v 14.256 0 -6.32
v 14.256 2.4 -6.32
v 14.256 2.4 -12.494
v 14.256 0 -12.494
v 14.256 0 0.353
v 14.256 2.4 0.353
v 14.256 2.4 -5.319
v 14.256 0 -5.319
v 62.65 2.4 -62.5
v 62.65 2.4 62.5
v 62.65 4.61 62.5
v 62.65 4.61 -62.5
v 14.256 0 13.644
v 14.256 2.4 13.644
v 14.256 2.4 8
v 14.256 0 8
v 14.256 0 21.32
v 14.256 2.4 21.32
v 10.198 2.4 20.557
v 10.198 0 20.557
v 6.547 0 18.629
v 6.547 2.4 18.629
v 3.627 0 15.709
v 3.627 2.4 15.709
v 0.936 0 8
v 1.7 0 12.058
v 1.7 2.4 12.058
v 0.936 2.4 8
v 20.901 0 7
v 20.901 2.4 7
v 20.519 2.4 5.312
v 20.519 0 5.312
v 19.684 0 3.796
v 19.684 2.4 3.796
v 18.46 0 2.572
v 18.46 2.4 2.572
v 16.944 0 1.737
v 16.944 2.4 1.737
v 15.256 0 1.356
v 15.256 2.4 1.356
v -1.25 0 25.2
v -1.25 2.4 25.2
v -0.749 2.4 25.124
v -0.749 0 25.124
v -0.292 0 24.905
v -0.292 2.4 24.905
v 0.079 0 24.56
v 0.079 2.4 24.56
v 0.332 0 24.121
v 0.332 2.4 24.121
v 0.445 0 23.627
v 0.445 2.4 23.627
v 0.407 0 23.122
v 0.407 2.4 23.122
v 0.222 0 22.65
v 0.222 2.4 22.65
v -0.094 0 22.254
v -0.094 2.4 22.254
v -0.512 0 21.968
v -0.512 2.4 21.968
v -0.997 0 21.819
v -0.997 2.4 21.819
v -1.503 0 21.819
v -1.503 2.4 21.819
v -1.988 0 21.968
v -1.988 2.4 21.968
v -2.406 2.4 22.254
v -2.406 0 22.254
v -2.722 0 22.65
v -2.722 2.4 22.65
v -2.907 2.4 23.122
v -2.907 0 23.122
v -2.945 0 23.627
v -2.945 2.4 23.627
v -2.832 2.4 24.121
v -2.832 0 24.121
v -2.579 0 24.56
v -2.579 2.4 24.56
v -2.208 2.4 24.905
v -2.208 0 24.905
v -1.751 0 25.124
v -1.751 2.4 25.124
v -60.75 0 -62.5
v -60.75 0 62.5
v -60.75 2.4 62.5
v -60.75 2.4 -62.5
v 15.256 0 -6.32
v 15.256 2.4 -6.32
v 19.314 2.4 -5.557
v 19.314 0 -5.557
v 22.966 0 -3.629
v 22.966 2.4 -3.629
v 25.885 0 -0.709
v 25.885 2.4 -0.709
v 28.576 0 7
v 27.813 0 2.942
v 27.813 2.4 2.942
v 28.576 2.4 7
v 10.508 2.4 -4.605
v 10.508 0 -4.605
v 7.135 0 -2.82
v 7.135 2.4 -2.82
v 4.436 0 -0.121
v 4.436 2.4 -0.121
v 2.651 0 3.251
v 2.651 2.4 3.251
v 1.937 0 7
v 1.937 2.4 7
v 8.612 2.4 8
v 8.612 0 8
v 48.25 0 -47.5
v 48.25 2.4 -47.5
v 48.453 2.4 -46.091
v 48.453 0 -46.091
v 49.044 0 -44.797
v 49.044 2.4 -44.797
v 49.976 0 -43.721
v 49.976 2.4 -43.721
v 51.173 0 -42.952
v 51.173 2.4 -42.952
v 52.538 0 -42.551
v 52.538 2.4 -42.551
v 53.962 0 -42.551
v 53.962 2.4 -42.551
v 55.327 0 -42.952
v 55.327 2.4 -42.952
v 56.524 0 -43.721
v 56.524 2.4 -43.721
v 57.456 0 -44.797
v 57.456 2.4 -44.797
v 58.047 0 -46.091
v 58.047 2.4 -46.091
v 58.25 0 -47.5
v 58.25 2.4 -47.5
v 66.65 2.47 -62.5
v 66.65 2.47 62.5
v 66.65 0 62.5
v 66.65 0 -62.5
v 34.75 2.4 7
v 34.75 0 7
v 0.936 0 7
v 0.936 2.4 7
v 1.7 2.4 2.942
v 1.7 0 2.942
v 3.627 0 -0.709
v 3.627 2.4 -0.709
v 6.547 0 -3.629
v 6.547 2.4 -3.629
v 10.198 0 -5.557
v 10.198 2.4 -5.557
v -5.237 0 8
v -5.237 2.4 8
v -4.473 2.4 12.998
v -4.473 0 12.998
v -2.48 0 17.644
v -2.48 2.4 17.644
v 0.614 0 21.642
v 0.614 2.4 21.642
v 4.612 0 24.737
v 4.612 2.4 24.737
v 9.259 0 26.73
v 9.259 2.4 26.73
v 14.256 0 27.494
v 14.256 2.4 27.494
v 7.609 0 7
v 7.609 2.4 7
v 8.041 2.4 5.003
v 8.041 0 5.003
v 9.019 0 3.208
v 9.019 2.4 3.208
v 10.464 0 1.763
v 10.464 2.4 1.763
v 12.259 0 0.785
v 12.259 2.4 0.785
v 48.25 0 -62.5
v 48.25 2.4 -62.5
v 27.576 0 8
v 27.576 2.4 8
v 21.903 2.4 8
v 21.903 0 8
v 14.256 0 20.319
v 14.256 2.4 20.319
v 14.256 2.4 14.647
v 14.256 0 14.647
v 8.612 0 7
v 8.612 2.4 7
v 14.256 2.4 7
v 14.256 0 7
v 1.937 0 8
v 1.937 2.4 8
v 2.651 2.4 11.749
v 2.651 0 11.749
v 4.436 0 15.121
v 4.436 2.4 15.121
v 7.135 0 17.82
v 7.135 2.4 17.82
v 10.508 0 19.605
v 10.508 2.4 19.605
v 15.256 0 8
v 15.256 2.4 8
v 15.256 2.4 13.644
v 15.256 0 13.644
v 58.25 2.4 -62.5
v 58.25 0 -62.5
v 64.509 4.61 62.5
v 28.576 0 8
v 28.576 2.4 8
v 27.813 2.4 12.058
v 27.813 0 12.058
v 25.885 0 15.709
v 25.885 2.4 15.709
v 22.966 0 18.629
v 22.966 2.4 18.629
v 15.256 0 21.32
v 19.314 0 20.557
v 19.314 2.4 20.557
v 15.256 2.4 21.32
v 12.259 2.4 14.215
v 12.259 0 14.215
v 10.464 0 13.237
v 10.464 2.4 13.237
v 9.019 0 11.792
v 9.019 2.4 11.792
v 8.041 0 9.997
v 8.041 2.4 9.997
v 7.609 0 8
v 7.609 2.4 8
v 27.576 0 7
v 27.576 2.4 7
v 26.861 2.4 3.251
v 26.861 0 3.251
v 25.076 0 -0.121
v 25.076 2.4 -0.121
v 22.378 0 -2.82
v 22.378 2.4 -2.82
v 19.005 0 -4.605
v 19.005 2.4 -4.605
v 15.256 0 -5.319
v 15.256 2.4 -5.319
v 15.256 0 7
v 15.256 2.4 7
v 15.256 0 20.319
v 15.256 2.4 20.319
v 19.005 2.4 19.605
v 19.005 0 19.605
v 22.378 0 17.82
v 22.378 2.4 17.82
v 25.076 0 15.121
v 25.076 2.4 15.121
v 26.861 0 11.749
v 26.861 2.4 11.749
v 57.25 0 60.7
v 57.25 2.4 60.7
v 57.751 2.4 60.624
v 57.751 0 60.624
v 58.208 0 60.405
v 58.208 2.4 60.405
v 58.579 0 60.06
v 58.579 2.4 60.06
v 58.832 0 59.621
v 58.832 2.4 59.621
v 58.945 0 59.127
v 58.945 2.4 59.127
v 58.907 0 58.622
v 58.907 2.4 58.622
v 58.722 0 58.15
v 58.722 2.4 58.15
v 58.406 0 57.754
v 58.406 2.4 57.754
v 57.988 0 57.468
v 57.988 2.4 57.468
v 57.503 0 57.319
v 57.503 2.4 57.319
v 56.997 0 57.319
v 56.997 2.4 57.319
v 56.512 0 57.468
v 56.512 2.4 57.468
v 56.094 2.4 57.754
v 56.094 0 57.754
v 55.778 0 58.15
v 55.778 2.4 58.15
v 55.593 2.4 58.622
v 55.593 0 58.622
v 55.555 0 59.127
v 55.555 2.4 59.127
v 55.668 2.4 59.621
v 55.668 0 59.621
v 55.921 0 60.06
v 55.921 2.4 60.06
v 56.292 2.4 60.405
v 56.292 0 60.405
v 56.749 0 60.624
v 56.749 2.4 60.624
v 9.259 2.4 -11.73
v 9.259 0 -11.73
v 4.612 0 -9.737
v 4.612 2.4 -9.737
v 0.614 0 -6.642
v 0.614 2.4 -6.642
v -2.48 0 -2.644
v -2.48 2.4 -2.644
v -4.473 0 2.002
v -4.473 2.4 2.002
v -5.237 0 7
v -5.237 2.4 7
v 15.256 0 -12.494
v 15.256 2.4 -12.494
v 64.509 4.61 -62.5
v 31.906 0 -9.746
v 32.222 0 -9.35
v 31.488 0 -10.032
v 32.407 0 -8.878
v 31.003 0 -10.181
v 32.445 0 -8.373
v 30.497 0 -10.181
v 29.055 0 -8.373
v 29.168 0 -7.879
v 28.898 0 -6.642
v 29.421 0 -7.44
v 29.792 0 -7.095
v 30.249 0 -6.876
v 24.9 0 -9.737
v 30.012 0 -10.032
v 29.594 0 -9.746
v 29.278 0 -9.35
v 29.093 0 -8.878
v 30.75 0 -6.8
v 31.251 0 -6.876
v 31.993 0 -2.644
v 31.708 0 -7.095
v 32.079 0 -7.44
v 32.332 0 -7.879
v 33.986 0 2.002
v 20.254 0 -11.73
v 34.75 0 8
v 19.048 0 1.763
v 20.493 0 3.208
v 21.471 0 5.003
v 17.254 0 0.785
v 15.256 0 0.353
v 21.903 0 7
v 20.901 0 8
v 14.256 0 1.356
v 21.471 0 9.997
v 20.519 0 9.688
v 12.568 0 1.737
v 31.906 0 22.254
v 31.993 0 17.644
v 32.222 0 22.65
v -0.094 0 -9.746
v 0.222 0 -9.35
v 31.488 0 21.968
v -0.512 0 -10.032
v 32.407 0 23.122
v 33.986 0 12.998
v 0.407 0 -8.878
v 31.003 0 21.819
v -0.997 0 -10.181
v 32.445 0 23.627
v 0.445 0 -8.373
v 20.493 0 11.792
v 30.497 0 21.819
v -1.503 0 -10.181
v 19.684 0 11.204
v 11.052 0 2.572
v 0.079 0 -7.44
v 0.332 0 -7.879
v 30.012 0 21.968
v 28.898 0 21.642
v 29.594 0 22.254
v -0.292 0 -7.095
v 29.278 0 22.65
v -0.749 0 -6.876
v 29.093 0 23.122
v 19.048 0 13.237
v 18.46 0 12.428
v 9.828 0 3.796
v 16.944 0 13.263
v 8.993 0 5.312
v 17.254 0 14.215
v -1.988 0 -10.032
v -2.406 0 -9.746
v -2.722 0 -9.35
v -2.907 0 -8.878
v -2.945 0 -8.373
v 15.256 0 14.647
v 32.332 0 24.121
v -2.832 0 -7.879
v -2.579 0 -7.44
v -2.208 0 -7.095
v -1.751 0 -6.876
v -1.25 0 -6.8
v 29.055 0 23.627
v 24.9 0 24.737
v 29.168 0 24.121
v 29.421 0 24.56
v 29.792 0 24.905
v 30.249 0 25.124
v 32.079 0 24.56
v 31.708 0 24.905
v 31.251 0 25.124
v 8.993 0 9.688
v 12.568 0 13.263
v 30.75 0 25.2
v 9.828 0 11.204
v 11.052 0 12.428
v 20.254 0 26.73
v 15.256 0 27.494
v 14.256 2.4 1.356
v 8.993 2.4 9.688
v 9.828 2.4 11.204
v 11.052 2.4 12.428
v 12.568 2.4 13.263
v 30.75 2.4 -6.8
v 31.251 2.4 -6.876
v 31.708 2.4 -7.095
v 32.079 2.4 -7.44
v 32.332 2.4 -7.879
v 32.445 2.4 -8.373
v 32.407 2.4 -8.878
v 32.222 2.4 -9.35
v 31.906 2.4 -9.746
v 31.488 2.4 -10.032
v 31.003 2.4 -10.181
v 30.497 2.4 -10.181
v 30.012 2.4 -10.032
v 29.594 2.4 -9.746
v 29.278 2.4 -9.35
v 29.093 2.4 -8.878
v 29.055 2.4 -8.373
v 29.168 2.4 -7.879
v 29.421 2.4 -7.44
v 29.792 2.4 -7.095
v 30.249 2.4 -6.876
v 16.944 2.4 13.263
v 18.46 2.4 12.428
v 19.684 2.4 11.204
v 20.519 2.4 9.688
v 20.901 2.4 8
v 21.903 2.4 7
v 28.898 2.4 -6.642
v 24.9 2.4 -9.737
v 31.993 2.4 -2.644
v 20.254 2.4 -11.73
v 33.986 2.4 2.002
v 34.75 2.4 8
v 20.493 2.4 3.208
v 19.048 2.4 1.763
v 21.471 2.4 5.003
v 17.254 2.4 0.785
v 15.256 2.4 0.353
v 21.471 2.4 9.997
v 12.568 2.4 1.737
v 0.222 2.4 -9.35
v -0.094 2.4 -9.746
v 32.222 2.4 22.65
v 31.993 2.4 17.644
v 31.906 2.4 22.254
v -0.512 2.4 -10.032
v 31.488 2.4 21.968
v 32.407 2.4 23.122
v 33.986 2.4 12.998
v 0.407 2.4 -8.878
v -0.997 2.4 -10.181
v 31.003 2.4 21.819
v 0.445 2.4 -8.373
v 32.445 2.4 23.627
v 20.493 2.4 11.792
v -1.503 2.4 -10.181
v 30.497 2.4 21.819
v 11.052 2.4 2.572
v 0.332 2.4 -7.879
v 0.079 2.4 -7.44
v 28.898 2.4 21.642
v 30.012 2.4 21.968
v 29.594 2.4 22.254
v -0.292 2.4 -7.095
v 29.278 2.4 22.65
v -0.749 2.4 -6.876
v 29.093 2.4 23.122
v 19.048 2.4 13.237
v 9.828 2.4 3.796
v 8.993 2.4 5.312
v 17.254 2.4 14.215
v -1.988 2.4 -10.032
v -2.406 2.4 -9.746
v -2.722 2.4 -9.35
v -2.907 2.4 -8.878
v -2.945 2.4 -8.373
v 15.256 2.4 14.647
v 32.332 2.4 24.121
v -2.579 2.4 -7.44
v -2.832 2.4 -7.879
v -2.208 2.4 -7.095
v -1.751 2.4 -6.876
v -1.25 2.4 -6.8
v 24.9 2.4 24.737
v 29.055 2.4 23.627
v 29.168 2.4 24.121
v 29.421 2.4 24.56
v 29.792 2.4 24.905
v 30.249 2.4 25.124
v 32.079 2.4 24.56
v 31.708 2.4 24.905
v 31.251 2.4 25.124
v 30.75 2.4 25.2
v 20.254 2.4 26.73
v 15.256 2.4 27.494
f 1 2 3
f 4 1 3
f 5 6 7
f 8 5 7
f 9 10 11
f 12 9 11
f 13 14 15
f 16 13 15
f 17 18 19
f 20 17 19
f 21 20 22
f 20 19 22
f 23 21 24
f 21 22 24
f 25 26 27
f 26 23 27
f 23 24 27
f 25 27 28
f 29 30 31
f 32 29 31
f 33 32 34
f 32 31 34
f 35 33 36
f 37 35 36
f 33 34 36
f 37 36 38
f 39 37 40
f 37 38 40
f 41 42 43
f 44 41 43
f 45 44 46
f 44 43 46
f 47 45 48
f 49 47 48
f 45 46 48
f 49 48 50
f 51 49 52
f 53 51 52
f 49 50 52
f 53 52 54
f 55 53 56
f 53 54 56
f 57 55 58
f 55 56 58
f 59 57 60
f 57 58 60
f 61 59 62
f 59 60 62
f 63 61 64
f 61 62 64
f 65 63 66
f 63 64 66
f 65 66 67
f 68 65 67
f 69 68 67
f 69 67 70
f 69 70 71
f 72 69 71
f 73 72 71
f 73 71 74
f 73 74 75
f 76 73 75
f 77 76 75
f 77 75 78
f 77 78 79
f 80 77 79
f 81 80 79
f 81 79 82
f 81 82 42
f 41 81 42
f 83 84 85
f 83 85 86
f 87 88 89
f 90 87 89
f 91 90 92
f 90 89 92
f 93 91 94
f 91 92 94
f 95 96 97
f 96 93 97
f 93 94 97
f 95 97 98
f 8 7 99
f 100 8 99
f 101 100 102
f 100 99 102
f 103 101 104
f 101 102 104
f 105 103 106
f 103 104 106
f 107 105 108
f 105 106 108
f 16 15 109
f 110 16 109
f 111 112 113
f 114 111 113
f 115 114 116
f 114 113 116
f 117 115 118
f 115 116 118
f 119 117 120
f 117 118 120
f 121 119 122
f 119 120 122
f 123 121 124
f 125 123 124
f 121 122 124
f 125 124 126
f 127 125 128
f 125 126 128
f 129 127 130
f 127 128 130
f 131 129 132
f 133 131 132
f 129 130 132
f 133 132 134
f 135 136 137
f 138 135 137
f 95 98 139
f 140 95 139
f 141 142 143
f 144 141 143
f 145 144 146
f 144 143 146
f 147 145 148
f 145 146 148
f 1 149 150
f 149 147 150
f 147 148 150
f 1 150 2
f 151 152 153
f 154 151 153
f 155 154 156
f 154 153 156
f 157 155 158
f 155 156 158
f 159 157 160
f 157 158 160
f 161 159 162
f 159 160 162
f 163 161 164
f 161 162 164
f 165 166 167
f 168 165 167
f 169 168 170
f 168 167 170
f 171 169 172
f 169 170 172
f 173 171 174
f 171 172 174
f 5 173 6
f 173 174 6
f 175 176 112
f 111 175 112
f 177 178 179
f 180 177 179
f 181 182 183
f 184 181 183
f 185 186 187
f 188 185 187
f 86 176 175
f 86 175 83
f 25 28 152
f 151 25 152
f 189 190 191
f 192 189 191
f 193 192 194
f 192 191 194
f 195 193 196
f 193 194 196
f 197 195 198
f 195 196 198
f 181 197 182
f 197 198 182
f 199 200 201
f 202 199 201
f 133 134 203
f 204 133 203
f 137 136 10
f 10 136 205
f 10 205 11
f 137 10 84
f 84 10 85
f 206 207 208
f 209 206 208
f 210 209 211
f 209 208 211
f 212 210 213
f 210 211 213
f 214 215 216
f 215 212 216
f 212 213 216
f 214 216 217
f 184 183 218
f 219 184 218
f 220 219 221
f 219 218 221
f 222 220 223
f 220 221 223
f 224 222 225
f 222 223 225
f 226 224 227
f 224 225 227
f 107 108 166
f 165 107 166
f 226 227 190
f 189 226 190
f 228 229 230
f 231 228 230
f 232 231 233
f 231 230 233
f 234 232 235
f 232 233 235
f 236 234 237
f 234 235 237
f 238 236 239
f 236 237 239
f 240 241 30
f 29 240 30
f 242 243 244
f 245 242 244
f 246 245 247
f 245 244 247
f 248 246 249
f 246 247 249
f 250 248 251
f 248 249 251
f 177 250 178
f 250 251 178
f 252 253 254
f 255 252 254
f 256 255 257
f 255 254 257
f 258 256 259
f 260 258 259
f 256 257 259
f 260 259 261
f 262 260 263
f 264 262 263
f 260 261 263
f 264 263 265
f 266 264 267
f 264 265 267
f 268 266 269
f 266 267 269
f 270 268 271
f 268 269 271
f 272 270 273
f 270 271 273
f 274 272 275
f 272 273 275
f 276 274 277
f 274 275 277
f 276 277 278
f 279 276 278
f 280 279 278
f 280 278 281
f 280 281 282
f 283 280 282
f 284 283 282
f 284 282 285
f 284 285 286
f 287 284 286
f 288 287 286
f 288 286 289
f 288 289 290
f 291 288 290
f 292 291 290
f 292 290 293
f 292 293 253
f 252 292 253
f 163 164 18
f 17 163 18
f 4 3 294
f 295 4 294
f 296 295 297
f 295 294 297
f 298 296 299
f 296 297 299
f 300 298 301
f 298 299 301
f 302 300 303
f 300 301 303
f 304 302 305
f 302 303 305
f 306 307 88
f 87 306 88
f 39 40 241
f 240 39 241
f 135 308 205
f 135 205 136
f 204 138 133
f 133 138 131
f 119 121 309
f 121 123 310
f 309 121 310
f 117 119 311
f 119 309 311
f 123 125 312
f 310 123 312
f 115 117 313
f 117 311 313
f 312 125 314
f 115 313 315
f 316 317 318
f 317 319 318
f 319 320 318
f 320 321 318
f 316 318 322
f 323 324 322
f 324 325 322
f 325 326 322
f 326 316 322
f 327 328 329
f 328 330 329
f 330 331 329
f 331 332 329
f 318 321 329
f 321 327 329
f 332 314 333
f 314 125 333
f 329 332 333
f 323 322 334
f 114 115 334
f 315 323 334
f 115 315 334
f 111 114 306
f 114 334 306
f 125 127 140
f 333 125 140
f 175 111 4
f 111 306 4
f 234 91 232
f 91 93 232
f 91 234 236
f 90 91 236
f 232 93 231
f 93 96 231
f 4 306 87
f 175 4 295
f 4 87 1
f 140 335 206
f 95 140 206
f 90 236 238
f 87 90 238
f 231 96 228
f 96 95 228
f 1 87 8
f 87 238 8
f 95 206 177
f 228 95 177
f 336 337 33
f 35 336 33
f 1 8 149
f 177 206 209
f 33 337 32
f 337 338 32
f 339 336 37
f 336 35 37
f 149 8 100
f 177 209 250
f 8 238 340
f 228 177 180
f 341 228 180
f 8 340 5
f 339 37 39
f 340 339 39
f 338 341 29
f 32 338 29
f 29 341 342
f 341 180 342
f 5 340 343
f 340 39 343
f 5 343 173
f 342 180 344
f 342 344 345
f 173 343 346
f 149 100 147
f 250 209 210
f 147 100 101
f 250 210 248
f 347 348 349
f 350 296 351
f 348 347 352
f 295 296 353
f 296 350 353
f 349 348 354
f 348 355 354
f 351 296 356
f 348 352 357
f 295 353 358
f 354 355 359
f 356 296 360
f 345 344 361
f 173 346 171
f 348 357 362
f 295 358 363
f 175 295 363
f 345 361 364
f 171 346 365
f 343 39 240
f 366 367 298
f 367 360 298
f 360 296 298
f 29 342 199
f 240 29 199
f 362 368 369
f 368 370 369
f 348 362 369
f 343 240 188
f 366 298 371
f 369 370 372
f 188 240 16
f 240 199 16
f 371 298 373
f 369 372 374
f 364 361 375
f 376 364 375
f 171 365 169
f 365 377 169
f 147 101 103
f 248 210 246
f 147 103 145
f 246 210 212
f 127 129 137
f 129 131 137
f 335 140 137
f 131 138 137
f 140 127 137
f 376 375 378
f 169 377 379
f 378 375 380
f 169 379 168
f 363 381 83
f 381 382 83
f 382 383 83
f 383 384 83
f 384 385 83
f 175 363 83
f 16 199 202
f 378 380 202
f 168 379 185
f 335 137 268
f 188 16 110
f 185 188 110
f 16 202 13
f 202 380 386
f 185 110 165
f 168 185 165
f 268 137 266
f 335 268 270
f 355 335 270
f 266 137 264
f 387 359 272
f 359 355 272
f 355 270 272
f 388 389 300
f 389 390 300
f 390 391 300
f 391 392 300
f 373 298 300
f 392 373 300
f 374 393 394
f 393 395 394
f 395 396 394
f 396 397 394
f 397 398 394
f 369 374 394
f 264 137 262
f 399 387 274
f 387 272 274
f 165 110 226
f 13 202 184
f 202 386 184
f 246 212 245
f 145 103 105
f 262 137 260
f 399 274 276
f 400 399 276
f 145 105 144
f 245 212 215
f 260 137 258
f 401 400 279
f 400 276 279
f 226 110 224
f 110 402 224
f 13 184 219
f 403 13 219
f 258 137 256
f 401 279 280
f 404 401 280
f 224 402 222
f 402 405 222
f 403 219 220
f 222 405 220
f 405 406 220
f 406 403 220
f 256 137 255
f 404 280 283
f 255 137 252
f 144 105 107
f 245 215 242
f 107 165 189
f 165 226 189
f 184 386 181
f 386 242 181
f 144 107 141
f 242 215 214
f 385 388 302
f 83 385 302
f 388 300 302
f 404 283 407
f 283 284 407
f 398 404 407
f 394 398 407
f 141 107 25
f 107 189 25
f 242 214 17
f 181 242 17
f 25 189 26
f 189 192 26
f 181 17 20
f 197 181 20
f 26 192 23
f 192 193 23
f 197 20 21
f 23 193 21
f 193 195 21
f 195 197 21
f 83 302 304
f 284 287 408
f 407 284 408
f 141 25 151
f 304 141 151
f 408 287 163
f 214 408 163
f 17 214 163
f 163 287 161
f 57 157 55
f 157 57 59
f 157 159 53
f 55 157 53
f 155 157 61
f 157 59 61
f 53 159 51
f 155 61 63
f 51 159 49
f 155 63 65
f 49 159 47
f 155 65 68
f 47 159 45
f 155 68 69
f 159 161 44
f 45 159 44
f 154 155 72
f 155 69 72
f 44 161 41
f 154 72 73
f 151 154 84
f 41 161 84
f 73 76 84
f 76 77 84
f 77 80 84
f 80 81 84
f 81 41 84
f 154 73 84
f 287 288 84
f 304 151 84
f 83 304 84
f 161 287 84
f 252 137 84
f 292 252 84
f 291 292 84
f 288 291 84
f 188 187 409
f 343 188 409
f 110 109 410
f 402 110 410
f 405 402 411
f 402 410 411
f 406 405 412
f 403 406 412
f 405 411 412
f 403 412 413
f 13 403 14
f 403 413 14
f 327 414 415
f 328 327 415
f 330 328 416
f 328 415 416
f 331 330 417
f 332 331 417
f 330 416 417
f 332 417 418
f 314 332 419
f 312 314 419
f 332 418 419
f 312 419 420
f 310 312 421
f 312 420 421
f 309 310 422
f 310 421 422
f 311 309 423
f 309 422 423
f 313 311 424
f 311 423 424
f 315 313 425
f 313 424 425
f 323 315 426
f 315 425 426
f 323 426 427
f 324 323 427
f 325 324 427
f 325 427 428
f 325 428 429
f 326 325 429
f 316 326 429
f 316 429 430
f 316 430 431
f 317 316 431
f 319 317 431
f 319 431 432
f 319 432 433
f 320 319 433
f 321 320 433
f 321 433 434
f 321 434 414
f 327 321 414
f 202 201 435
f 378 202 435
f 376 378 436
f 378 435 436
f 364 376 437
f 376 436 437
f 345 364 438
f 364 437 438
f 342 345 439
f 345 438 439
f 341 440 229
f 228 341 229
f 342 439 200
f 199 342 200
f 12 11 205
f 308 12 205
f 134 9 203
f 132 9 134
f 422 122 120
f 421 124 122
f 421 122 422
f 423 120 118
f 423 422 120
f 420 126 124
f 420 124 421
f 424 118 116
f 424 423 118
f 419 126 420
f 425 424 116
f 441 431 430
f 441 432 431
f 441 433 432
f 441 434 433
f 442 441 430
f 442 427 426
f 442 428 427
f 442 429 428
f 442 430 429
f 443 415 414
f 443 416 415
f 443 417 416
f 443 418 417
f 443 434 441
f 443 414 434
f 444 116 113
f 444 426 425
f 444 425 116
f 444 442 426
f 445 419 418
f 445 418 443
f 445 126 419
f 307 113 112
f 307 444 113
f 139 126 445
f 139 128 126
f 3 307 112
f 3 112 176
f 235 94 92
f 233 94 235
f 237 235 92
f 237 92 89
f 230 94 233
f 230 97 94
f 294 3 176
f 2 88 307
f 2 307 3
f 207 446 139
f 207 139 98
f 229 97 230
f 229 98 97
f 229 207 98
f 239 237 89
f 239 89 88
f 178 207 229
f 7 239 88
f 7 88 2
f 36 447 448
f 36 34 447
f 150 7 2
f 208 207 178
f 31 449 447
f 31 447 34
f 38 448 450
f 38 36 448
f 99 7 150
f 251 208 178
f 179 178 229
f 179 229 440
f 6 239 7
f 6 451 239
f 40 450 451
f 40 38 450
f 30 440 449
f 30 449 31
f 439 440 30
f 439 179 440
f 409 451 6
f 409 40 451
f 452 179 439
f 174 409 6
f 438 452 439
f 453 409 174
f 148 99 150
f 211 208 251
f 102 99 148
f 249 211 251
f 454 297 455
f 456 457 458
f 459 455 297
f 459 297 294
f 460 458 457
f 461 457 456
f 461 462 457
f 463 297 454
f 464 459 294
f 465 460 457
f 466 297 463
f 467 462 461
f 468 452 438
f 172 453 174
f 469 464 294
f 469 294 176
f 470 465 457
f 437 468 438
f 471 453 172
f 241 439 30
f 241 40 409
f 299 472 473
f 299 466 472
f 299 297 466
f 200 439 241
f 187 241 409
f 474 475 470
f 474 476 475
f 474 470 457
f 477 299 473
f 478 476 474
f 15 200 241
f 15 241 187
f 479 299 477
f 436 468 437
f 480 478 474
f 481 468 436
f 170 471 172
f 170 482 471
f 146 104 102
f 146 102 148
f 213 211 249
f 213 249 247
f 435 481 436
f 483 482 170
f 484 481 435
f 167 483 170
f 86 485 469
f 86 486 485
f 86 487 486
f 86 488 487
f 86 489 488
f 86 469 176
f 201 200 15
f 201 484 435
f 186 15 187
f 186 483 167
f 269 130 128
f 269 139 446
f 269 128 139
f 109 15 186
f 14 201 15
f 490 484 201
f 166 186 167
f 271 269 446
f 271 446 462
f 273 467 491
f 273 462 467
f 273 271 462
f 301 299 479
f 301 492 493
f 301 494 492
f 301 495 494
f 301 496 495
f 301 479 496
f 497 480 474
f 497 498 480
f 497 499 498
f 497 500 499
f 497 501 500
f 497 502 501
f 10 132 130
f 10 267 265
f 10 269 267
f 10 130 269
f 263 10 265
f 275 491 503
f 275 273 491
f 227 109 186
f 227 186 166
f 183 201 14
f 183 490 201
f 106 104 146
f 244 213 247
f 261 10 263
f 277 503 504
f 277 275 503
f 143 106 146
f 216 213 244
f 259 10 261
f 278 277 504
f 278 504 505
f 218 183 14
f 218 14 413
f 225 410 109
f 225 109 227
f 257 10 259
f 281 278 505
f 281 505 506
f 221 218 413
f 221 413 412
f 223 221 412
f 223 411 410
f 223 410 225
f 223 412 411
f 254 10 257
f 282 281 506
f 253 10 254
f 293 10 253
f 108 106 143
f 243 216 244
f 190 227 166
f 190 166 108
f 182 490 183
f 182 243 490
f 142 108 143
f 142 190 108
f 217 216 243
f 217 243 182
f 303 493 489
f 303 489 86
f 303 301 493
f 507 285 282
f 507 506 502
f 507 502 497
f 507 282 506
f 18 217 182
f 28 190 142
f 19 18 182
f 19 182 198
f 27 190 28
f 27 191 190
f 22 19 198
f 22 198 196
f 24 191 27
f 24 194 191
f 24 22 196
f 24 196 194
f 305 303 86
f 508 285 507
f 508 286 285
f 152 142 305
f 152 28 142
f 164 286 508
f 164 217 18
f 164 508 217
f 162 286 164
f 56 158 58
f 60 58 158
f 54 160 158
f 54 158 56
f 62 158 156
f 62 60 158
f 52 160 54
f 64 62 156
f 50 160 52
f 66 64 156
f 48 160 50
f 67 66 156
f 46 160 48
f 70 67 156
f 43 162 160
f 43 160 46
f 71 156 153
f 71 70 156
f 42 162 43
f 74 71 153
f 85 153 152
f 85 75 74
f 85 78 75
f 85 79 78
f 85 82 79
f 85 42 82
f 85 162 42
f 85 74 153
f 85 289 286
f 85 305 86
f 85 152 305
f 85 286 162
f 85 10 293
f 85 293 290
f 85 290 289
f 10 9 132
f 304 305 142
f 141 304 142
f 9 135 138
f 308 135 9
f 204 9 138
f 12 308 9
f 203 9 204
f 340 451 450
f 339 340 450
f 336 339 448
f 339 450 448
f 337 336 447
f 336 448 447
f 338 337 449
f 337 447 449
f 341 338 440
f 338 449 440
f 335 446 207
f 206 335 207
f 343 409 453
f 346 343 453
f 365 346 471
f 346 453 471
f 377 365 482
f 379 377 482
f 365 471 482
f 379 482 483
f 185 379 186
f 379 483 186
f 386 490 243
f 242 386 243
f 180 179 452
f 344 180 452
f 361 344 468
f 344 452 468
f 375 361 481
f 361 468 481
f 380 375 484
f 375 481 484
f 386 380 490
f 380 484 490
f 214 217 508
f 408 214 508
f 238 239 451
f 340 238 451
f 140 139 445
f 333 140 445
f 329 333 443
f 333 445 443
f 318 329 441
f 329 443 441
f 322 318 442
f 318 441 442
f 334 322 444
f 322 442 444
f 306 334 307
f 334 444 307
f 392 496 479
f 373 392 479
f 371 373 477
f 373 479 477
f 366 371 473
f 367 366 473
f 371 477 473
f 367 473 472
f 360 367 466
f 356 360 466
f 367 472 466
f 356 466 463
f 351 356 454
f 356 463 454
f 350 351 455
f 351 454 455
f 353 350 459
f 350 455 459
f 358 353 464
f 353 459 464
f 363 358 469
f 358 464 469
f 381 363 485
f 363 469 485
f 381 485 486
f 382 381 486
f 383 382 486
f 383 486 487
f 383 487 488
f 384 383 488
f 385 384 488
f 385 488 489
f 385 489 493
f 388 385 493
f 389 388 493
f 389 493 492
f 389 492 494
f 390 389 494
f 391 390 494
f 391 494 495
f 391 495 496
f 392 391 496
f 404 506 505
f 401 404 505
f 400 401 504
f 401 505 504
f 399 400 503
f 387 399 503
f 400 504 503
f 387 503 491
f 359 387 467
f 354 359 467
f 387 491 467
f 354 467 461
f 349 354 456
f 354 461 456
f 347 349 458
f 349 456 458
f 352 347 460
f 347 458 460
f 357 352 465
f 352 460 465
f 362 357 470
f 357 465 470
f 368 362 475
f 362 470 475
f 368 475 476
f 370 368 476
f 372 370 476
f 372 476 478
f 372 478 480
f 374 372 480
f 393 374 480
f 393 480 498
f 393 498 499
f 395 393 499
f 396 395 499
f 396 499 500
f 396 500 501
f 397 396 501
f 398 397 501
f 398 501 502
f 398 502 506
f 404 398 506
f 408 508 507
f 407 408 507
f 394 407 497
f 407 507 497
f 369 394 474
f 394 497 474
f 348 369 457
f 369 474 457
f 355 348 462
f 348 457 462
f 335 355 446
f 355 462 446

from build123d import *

# Parameters (mm, degrees)
SKETCH1_W           = 121.5
SKETCH1_H           = 125
BOSS_EXTRUDE1_DEPTH = 2.4
BOSS_EXTRUDE2_DEPTH = 125
SKETCH4_R           = 1.7
CUT_EXTRUDE1_DEPTH  = 92.401490688
CUT_EXTRUDE2_DEPTH  = 92.401490688
SKETCH6_R           = 1.7
CUT_EXTRUDE3_DEPTH  = 92.401490688
CUT_EXTRUDE4_DEPTH  = 92.401490688
CIRPATTERN1_COUNT   = 4


with BuildPart() as part:
    # Sketch1 → Boss-Extrude1 (new body)
    with BuildSketch(Plane(origin=(0, 0, 0), x_dir=(1, 0, 0), z_dir=(0, 1, 0))):
        Rectangle(SKETCH1_W, SKETCH1_H)
    extrude(amount=BOSS_EXTRUDE1_DEPTH)

    # Sketch3 → Boss-Extrude2 (add)
    with BuildSketch(Plane.XY.offset(62.5)):
        Polygon((60.75, 0), (60.75, 2.4), (62.55, 2.4), (62.65, 2.4), (62.65, 4.61), (64.508602565, 4.61), (66.65, 2.470350907), (66.65, 0), align=None)
    extrude(amount=-BOSS_EXTRUDE2_DEPTH)

    # Sketch4 → Cut-Extrude1 (cut, through all)
    with BuildSketch(Plane(origin=(0, 2.4, 0), x_dir=(1, 0, 0), z_dir=(0, 1, 0))):
        with Locations(Location((57.25, -59, 0), (0, 0, 270))):
            Circle(SKETCH4_R)
    extrude(amount=-CUT_EXTRUDE1_DEPTH, mode=Mode.SUBTRACT)

    # Sketch5 → Cut-Extrude2 (cut, through all)
    with BuildSketch(Plane(origin=(0, 2.4, 0), x_dir=(1, 0, 0), z_dir=(0, 1, 0))):
        with BuildLine():
            Line((58.25, 47.5), (58.25, 62.5))
            Line((58.25, 62.5), (48.25, 62.5))
            Line((48.25, 62.5), (48.25, 47.5))
            ThreePointArc((48.25, 47.5), (53.25, 42.5), (58.25, 47.5))
        make_face()
    extrude(amount=-CUT_EXTRUDE2_DEPTH, mode=Mode.SUBTRACT)

    # Sketch6 → Cut-Extrude3 (cut, through all)
    with BuildSketch(Plane(origin=(0, 2.4, 0), x_dir=(1, 0, 0), z_dir=(0, 1, 0))):
        with Locations(Location((-1.25, -23.5, 0), (0, 0, 270))):
            Circle(SKETCH6_R)
        with Locations(Location((30.75, -23.5, 0), (0, 0, 270))):
            Circle(SKETCH6_R)
        with Locations(Location((30.75, 8.5, 0), (0, 0, 270))):
            Circle(SKETCH6_R)
        with Locations(Location((-1.25, 8.5, 0), (0, 0, 270))):
            Circle(SKETCH6_R)
    extrude(amount=-CUT_EXTRUDE3_DEPTH, mode=Mode.SUBTRACT)

    # Sketch7 → Cut-Extrude4 (cut, through all)
    with BuildSketch(Plane(origin=(0, 2.4, 0), x_dir=(1, 0, 0), z_dir=(0, 1, 0))):
        with BuildLine():
            Line((15.256250977, -7), (20.900523404, -7))
            ThreePointArc((20.900523404, -7), (19.115269425, -3.140981552), (15.256250977, -1.355727573))
            Line((15.256250977, -1.355727573), (15.256250977, -7))
        make_face()
        with BuildLine():
            Line((21.903365757, -7), (27.575669866, -7))
            ThreePointArc((27.575669866, -7), (23.827841263, 1.571590286), (15.256250977, 5.319418889))
            Line((15.256250977, 5.319418889), (15.256250977, -0.35288522))
            ThreePointArc((15.256250977, -0.35288522), (19.822376206, -2.433874771), (21.903365757, -7))
        make_face()
        with BuildLine():
            ThreePointArc((15.256250977, 6.320124192), (24.534948045, 2.278697068), (28.576375169, -7))
            Line((28.576375169, -7), (34.75, -7))
            ThreePointArc((34.75, -7), (28.898386601, 6.642135624), (15.256250977, 12.493749023))
            Line((15.256250977, 12.493749023), (15.256250977, 6.320124192))
        make_face()
    cut_extrude4 = extrude(amount=-CUT_EXTRUDE4_DEPTH, mode=Mode.SUBTRACT)

    # CirPattern1: Cut-Extrude4 ×4 about axis
    cirpattern1_axis = Axis((14.756250977, 0, 7.5), (0, 1, 0))
    for i in range(1, CIRPATTERN1_COUNT):
        add(cut_extrude4.rotate(cirpattern1_axis, i * 360 / CIRPATTERN1_COUNT), mode=Mode.SUBTRACT)


solid = part.part
